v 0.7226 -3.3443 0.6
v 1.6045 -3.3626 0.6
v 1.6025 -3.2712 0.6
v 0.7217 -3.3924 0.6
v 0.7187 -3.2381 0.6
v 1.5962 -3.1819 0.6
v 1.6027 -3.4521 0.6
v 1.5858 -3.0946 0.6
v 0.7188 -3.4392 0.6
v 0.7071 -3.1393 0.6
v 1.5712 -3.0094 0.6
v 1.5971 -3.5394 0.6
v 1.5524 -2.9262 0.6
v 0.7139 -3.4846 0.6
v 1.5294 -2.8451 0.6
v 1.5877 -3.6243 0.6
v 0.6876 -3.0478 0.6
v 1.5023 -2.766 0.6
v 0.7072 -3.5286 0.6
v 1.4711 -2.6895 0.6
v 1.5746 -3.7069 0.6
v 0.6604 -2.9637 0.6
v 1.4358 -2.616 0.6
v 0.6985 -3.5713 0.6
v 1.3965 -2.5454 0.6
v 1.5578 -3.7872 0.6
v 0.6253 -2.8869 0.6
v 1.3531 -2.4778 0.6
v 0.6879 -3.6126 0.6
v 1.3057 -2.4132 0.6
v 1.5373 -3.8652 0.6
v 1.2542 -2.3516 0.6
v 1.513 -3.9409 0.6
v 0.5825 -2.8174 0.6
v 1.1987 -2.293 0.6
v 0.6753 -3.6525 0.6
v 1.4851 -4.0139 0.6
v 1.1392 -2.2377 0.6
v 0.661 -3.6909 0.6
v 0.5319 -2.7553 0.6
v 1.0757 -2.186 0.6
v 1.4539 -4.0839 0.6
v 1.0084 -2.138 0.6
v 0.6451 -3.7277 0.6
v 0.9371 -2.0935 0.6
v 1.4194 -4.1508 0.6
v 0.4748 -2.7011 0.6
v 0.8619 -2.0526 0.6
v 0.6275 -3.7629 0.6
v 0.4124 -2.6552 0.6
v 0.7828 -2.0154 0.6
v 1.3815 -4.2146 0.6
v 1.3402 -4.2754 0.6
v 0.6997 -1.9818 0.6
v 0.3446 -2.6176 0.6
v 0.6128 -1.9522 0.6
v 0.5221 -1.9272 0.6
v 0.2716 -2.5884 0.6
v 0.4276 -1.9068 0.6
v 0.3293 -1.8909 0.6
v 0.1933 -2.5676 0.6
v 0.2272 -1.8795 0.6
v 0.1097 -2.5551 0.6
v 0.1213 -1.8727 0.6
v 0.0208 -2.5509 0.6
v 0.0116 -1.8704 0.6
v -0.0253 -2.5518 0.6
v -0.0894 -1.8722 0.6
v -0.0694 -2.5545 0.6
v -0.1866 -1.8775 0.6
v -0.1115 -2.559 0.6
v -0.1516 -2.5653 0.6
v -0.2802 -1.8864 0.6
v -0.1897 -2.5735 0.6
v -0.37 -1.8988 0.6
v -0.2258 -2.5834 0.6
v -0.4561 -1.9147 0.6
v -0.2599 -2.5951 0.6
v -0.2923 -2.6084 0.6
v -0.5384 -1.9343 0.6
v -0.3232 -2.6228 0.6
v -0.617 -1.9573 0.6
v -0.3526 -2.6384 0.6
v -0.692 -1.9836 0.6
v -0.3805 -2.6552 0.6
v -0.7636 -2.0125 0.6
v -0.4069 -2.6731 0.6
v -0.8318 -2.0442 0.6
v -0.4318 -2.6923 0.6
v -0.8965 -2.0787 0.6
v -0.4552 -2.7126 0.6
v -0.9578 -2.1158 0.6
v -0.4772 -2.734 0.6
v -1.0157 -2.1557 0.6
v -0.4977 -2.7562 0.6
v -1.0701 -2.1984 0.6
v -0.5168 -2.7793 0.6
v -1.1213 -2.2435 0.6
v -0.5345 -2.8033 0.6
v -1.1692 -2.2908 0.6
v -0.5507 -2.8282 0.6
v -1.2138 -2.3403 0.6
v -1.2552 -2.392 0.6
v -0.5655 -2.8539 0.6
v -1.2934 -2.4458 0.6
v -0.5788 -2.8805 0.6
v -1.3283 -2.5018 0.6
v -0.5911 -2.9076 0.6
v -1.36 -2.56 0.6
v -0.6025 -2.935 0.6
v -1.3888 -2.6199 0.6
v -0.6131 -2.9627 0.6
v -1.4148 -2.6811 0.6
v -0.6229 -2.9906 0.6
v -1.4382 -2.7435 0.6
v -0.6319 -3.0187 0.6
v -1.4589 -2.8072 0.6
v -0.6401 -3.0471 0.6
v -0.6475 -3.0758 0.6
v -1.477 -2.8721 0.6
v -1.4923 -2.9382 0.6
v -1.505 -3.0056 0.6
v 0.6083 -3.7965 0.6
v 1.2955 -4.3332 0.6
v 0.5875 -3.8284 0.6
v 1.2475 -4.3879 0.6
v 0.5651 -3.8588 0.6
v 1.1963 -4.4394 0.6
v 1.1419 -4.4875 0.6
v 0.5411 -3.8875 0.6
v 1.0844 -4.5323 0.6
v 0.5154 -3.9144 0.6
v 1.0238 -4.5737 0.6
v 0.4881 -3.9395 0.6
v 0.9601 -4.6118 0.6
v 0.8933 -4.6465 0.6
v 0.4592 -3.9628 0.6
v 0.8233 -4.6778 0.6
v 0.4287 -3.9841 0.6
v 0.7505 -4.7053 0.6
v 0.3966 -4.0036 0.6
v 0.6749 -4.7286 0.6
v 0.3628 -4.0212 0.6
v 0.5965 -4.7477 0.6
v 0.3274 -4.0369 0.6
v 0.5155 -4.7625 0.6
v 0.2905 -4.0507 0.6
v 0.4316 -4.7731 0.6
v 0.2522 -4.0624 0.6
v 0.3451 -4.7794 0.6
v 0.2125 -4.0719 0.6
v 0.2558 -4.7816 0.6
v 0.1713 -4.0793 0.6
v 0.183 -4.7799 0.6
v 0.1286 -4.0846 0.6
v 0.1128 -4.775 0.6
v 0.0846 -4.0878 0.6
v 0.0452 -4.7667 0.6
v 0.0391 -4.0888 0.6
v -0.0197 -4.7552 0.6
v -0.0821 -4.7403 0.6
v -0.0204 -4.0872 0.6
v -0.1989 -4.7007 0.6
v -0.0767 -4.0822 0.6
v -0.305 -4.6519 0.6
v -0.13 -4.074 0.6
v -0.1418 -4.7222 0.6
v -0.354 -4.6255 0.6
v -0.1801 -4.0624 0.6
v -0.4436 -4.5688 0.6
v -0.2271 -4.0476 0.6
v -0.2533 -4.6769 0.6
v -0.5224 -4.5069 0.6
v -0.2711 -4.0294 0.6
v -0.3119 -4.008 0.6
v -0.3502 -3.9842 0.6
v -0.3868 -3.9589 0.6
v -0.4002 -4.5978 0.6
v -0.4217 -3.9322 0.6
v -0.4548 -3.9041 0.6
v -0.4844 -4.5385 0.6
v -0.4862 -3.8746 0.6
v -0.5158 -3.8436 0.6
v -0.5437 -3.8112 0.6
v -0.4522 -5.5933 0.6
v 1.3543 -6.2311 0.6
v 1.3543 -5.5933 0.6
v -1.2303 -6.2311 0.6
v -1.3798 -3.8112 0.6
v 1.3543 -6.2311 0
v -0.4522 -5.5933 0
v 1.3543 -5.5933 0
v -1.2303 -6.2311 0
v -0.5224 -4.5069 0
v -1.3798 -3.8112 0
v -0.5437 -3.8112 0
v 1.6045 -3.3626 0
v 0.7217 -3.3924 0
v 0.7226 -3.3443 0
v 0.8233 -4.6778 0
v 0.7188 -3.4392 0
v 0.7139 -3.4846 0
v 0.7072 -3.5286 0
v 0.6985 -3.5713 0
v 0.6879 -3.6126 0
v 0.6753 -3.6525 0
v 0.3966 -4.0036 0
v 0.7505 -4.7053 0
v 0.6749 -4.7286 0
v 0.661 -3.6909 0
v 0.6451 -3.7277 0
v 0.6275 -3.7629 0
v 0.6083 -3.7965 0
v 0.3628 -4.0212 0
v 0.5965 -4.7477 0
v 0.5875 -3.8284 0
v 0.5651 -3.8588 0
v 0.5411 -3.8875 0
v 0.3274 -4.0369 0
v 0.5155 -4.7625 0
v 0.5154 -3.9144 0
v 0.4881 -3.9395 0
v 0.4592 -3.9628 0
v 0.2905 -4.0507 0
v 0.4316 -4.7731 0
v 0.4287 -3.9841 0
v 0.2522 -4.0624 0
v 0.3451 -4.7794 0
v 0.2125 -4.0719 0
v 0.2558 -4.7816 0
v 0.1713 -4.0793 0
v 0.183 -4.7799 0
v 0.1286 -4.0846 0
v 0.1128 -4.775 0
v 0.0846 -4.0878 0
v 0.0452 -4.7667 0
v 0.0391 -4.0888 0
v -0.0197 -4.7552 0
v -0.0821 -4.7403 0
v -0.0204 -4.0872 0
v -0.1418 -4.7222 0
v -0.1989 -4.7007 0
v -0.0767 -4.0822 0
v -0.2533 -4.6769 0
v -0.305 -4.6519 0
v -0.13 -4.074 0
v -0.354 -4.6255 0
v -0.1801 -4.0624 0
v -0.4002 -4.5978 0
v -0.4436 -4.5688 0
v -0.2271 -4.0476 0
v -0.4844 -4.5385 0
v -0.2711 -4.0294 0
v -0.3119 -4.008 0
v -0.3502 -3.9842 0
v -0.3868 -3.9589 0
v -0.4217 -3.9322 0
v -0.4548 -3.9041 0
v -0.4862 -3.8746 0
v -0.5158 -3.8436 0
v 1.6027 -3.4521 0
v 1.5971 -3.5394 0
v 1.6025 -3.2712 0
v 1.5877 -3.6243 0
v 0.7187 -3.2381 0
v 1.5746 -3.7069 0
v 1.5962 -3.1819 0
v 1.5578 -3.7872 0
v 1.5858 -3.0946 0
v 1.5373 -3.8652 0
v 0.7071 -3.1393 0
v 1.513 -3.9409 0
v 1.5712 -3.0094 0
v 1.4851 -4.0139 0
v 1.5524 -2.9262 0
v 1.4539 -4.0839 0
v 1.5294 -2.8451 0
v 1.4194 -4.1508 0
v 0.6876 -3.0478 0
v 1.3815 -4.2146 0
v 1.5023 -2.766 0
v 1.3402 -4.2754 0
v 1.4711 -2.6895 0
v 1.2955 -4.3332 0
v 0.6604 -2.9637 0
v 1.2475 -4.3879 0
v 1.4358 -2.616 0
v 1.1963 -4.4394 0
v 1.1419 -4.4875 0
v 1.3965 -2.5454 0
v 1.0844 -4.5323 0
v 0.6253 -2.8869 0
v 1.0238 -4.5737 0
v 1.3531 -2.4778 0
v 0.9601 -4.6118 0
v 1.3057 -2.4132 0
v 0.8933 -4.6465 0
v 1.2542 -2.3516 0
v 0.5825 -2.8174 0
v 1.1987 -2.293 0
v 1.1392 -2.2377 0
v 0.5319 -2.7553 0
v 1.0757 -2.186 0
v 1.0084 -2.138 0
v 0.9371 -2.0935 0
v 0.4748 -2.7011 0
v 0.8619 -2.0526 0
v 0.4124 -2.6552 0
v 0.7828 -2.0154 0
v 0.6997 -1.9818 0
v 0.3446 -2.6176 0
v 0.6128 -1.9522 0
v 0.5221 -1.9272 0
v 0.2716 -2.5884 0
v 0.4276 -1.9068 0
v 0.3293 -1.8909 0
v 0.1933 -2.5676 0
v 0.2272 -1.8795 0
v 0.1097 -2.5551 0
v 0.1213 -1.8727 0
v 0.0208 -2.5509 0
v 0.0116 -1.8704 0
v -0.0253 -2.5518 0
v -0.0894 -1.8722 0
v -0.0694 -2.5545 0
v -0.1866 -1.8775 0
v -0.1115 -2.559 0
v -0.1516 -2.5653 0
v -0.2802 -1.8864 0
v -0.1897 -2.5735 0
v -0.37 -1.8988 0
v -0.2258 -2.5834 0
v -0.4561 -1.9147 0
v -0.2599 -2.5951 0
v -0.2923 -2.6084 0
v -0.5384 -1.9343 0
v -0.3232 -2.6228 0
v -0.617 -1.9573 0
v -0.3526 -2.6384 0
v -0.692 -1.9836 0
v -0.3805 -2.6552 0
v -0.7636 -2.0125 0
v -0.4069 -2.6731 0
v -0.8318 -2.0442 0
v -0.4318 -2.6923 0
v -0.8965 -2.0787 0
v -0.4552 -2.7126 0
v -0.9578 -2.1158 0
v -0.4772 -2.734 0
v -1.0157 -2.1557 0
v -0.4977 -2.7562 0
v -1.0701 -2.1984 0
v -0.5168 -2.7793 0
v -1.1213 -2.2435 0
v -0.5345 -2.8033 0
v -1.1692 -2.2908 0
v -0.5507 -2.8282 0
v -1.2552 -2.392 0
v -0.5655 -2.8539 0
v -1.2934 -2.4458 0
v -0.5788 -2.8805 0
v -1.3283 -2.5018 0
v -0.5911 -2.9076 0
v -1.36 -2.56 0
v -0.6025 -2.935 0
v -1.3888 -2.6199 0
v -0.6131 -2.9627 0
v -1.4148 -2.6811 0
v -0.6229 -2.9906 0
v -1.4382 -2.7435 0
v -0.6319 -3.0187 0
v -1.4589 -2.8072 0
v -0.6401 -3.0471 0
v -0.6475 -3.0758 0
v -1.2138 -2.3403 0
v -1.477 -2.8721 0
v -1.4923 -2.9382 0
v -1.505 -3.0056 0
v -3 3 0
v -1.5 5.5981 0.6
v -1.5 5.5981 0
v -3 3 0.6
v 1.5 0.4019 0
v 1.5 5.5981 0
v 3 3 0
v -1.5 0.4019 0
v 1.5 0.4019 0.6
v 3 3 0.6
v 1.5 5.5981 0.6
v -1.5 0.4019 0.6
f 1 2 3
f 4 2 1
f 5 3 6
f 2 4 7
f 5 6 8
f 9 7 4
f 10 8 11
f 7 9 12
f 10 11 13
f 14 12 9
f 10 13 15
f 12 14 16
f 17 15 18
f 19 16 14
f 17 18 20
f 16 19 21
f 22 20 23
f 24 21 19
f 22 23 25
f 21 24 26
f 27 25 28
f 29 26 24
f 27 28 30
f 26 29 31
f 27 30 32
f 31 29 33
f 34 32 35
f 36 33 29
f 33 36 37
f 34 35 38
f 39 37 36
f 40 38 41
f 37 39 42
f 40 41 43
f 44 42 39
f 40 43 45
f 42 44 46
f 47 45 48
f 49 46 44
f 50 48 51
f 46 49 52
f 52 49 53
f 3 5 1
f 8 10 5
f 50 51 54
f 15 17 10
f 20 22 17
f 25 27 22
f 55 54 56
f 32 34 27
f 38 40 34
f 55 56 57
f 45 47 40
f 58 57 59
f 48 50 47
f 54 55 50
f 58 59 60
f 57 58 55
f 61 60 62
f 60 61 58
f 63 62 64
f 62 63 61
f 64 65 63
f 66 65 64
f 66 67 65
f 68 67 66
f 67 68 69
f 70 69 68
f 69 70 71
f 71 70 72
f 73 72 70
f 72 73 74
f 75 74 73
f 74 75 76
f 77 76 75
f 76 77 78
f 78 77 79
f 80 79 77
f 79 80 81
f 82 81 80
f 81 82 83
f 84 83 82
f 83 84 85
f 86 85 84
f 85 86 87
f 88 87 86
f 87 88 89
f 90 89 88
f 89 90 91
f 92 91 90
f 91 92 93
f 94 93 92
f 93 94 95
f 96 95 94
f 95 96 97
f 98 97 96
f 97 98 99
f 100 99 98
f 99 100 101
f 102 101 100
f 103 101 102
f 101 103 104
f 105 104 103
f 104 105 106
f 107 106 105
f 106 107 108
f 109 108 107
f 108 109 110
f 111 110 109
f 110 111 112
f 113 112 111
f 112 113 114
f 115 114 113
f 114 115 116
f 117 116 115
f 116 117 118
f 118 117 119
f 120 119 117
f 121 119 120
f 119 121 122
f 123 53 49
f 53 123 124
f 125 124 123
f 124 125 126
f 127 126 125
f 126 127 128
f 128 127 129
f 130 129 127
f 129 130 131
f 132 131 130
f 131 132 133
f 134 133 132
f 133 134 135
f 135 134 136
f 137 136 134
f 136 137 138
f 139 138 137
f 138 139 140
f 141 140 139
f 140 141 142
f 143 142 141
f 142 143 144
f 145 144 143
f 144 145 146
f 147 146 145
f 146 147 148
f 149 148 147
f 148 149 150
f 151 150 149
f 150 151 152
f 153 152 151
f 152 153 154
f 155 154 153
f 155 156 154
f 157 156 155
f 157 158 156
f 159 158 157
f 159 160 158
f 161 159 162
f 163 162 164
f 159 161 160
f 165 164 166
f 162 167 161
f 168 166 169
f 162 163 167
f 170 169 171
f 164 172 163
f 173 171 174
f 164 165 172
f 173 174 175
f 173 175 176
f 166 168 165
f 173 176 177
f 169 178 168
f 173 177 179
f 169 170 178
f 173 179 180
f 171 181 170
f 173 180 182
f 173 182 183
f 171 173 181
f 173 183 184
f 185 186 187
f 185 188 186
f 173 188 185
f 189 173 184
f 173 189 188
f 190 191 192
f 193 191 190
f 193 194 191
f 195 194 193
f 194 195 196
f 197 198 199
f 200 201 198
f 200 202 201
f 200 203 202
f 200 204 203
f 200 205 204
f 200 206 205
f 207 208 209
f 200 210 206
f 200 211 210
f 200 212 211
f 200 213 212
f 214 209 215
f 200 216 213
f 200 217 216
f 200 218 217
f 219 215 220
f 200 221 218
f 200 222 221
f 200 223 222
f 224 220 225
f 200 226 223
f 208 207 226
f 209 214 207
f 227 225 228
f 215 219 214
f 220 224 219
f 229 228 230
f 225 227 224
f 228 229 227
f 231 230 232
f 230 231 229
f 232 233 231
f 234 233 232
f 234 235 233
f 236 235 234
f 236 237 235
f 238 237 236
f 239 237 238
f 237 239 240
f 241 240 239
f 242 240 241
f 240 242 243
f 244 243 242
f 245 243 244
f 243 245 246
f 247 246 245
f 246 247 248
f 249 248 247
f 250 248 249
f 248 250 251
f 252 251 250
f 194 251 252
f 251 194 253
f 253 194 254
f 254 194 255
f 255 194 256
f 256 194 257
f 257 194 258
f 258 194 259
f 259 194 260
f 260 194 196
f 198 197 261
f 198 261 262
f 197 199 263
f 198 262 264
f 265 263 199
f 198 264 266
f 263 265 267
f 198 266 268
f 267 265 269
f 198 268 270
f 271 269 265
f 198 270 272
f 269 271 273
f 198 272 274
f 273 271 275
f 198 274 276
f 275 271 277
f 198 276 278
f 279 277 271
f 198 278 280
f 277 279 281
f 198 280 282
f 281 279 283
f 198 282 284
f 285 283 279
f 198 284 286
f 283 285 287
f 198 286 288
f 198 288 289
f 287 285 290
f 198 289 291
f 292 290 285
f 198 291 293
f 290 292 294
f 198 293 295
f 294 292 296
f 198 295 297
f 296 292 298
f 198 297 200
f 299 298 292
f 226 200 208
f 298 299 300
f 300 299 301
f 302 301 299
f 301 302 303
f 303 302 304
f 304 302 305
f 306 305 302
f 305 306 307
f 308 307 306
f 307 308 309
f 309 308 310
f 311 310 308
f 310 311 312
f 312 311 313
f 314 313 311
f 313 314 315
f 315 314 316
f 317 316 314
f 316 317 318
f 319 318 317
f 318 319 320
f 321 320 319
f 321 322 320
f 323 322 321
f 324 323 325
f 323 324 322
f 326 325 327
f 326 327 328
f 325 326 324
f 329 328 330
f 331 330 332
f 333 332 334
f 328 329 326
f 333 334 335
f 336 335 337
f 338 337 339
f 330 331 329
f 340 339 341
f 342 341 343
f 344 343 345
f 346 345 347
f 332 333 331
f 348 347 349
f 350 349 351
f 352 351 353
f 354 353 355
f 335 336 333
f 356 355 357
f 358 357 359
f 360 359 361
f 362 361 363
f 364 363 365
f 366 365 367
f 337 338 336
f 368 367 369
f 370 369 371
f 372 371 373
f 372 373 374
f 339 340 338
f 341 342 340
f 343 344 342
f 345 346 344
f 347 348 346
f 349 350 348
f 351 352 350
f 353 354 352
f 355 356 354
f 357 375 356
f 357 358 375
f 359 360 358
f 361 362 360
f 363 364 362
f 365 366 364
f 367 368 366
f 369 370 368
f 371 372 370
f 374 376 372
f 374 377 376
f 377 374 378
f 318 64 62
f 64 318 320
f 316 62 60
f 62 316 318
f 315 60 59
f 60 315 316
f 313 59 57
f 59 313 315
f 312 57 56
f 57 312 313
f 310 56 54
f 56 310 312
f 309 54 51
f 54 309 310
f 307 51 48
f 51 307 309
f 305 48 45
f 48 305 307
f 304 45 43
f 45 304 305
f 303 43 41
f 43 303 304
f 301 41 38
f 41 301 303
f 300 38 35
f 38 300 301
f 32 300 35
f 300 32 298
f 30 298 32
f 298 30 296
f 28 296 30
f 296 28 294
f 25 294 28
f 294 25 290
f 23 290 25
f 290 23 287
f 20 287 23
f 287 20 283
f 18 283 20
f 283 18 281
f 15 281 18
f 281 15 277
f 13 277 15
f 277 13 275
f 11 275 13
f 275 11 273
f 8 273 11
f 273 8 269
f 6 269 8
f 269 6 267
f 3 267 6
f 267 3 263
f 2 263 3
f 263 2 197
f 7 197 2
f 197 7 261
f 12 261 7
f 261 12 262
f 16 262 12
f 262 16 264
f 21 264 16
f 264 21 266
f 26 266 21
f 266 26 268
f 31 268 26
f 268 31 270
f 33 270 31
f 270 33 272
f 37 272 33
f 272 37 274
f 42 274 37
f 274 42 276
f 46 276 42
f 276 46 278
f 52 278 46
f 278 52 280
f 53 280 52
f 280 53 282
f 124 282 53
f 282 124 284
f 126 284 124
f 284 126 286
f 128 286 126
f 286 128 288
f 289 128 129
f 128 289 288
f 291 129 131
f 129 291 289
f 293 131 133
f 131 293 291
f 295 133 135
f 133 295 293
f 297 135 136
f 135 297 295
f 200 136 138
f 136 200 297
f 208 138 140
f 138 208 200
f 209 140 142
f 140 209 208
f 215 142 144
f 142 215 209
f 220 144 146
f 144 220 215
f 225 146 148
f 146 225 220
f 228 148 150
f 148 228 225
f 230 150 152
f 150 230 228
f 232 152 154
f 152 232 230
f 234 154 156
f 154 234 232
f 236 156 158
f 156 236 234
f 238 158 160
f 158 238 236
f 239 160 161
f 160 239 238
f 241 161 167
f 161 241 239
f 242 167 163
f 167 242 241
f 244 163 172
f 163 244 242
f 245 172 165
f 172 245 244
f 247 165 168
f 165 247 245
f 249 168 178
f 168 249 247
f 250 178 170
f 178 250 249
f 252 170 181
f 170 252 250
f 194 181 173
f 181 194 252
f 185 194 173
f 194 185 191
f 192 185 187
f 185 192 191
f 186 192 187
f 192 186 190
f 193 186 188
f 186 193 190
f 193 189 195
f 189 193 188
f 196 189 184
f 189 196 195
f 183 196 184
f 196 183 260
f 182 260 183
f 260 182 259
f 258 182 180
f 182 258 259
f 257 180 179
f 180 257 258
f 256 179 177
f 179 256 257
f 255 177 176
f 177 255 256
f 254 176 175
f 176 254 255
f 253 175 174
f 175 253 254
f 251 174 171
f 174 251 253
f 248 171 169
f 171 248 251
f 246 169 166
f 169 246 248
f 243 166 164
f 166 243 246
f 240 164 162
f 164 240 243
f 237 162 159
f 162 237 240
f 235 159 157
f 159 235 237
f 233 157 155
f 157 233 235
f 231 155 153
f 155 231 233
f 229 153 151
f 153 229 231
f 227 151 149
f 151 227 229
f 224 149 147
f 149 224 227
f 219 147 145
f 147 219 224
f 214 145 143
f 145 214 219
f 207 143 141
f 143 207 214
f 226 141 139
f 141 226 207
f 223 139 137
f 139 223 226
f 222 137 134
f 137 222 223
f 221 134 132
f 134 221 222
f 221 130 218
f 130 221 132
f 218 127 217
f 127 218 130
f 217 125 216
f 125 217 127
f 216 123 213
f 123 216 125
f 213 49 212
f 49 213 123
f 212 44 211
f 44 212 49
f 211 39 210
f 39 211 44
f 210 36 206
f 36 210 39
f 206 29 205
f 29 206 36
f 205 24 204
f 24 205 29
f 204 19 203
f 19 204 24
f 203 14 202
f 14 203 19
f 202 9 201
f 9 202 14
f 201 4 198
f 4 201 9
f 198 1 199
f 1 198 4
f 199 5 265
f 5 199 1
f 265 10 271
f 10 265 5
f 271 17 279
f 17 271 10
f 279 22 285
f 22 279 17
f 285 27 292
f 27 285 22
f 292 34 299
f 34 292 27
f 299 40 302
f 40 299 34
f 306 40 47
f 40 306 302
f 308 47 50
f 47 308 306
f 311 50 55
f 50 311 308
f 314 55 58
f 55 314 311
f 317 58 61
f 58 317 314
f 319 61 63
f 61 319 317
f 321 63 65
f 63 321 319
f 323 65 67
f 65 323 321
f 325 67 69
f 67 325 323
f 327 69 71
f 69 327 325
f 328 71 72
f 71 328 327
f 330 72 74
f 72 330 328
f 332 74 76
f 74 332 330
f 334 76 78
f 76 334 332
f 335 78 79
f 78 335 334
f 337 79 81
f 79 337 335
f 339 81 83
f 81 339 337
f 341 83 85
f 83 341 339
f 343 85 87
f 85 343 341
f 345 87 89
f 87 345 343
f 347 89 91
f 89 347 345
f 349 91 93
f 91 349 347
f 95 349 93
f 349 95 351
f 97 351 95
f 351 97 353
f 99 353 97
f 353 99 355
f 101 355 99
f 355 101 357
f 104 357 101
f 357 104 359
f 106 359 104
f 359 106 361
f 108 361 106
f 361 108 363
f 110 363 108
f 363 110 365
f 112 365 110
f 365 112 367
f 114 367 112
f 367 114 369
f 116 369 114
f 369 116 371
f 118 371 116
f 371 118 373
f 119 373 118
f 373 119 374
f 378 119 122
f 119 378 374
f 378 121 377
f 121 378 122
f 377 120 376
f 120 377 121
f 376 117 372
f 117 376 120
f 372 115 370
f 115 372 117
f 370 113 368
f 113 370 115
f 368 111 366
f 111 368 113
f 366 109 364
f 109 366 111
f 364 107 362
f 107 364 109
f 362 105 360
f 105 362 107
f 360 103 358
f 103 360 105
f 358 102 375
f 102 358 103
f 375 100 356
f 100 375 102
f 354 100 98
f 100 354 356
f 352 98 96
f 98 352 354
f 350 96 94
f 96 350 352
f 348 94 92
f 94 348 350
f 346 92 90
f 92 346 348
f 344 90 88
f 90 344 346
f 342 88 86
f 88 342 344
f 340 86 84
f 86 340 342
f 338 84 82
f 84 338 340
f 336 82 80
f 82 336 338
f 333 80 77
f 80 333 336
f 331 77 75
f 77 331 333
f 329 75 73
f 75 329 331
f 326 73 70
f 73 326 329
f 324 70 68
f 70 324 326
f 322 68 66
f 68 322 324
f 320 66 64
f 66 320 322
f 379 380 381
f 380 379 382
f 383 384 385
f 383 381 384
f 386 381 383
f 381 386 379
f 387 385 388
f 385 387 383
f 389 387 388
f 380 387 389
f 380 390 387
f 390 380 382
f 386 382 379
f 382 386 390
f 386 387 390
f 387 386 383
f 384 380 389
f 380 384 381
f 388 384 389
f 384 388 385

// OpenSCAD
$fn = 50;

difference() {
	union() {
		translate(v = [0.0, -4.0, 0.6]) {
			rotate(a = [180, 0, 0]) {
				linear_extrude(height = 0.6) {
					text(font = "Liberation Sans:style=Bold", halign = "center", size = 4.5, text = "5", valign = "center");
				}
			}
		}
		translate(v = [0, 3, 0]) {
			linear_extrude(height = 0.6) {
				polygon(points = [[3.0, 0.0], [1.5000000000000004, 2.598076211353316], [-1.4999999999999993, 2.598076211353316], [-3.0, 3.6739403974420594e-16], [-1.5000000000000013, -2.5980762113533156], [1.499999999999998, -2.598076211353317]]);
			}
		}
	}
	union();
}
